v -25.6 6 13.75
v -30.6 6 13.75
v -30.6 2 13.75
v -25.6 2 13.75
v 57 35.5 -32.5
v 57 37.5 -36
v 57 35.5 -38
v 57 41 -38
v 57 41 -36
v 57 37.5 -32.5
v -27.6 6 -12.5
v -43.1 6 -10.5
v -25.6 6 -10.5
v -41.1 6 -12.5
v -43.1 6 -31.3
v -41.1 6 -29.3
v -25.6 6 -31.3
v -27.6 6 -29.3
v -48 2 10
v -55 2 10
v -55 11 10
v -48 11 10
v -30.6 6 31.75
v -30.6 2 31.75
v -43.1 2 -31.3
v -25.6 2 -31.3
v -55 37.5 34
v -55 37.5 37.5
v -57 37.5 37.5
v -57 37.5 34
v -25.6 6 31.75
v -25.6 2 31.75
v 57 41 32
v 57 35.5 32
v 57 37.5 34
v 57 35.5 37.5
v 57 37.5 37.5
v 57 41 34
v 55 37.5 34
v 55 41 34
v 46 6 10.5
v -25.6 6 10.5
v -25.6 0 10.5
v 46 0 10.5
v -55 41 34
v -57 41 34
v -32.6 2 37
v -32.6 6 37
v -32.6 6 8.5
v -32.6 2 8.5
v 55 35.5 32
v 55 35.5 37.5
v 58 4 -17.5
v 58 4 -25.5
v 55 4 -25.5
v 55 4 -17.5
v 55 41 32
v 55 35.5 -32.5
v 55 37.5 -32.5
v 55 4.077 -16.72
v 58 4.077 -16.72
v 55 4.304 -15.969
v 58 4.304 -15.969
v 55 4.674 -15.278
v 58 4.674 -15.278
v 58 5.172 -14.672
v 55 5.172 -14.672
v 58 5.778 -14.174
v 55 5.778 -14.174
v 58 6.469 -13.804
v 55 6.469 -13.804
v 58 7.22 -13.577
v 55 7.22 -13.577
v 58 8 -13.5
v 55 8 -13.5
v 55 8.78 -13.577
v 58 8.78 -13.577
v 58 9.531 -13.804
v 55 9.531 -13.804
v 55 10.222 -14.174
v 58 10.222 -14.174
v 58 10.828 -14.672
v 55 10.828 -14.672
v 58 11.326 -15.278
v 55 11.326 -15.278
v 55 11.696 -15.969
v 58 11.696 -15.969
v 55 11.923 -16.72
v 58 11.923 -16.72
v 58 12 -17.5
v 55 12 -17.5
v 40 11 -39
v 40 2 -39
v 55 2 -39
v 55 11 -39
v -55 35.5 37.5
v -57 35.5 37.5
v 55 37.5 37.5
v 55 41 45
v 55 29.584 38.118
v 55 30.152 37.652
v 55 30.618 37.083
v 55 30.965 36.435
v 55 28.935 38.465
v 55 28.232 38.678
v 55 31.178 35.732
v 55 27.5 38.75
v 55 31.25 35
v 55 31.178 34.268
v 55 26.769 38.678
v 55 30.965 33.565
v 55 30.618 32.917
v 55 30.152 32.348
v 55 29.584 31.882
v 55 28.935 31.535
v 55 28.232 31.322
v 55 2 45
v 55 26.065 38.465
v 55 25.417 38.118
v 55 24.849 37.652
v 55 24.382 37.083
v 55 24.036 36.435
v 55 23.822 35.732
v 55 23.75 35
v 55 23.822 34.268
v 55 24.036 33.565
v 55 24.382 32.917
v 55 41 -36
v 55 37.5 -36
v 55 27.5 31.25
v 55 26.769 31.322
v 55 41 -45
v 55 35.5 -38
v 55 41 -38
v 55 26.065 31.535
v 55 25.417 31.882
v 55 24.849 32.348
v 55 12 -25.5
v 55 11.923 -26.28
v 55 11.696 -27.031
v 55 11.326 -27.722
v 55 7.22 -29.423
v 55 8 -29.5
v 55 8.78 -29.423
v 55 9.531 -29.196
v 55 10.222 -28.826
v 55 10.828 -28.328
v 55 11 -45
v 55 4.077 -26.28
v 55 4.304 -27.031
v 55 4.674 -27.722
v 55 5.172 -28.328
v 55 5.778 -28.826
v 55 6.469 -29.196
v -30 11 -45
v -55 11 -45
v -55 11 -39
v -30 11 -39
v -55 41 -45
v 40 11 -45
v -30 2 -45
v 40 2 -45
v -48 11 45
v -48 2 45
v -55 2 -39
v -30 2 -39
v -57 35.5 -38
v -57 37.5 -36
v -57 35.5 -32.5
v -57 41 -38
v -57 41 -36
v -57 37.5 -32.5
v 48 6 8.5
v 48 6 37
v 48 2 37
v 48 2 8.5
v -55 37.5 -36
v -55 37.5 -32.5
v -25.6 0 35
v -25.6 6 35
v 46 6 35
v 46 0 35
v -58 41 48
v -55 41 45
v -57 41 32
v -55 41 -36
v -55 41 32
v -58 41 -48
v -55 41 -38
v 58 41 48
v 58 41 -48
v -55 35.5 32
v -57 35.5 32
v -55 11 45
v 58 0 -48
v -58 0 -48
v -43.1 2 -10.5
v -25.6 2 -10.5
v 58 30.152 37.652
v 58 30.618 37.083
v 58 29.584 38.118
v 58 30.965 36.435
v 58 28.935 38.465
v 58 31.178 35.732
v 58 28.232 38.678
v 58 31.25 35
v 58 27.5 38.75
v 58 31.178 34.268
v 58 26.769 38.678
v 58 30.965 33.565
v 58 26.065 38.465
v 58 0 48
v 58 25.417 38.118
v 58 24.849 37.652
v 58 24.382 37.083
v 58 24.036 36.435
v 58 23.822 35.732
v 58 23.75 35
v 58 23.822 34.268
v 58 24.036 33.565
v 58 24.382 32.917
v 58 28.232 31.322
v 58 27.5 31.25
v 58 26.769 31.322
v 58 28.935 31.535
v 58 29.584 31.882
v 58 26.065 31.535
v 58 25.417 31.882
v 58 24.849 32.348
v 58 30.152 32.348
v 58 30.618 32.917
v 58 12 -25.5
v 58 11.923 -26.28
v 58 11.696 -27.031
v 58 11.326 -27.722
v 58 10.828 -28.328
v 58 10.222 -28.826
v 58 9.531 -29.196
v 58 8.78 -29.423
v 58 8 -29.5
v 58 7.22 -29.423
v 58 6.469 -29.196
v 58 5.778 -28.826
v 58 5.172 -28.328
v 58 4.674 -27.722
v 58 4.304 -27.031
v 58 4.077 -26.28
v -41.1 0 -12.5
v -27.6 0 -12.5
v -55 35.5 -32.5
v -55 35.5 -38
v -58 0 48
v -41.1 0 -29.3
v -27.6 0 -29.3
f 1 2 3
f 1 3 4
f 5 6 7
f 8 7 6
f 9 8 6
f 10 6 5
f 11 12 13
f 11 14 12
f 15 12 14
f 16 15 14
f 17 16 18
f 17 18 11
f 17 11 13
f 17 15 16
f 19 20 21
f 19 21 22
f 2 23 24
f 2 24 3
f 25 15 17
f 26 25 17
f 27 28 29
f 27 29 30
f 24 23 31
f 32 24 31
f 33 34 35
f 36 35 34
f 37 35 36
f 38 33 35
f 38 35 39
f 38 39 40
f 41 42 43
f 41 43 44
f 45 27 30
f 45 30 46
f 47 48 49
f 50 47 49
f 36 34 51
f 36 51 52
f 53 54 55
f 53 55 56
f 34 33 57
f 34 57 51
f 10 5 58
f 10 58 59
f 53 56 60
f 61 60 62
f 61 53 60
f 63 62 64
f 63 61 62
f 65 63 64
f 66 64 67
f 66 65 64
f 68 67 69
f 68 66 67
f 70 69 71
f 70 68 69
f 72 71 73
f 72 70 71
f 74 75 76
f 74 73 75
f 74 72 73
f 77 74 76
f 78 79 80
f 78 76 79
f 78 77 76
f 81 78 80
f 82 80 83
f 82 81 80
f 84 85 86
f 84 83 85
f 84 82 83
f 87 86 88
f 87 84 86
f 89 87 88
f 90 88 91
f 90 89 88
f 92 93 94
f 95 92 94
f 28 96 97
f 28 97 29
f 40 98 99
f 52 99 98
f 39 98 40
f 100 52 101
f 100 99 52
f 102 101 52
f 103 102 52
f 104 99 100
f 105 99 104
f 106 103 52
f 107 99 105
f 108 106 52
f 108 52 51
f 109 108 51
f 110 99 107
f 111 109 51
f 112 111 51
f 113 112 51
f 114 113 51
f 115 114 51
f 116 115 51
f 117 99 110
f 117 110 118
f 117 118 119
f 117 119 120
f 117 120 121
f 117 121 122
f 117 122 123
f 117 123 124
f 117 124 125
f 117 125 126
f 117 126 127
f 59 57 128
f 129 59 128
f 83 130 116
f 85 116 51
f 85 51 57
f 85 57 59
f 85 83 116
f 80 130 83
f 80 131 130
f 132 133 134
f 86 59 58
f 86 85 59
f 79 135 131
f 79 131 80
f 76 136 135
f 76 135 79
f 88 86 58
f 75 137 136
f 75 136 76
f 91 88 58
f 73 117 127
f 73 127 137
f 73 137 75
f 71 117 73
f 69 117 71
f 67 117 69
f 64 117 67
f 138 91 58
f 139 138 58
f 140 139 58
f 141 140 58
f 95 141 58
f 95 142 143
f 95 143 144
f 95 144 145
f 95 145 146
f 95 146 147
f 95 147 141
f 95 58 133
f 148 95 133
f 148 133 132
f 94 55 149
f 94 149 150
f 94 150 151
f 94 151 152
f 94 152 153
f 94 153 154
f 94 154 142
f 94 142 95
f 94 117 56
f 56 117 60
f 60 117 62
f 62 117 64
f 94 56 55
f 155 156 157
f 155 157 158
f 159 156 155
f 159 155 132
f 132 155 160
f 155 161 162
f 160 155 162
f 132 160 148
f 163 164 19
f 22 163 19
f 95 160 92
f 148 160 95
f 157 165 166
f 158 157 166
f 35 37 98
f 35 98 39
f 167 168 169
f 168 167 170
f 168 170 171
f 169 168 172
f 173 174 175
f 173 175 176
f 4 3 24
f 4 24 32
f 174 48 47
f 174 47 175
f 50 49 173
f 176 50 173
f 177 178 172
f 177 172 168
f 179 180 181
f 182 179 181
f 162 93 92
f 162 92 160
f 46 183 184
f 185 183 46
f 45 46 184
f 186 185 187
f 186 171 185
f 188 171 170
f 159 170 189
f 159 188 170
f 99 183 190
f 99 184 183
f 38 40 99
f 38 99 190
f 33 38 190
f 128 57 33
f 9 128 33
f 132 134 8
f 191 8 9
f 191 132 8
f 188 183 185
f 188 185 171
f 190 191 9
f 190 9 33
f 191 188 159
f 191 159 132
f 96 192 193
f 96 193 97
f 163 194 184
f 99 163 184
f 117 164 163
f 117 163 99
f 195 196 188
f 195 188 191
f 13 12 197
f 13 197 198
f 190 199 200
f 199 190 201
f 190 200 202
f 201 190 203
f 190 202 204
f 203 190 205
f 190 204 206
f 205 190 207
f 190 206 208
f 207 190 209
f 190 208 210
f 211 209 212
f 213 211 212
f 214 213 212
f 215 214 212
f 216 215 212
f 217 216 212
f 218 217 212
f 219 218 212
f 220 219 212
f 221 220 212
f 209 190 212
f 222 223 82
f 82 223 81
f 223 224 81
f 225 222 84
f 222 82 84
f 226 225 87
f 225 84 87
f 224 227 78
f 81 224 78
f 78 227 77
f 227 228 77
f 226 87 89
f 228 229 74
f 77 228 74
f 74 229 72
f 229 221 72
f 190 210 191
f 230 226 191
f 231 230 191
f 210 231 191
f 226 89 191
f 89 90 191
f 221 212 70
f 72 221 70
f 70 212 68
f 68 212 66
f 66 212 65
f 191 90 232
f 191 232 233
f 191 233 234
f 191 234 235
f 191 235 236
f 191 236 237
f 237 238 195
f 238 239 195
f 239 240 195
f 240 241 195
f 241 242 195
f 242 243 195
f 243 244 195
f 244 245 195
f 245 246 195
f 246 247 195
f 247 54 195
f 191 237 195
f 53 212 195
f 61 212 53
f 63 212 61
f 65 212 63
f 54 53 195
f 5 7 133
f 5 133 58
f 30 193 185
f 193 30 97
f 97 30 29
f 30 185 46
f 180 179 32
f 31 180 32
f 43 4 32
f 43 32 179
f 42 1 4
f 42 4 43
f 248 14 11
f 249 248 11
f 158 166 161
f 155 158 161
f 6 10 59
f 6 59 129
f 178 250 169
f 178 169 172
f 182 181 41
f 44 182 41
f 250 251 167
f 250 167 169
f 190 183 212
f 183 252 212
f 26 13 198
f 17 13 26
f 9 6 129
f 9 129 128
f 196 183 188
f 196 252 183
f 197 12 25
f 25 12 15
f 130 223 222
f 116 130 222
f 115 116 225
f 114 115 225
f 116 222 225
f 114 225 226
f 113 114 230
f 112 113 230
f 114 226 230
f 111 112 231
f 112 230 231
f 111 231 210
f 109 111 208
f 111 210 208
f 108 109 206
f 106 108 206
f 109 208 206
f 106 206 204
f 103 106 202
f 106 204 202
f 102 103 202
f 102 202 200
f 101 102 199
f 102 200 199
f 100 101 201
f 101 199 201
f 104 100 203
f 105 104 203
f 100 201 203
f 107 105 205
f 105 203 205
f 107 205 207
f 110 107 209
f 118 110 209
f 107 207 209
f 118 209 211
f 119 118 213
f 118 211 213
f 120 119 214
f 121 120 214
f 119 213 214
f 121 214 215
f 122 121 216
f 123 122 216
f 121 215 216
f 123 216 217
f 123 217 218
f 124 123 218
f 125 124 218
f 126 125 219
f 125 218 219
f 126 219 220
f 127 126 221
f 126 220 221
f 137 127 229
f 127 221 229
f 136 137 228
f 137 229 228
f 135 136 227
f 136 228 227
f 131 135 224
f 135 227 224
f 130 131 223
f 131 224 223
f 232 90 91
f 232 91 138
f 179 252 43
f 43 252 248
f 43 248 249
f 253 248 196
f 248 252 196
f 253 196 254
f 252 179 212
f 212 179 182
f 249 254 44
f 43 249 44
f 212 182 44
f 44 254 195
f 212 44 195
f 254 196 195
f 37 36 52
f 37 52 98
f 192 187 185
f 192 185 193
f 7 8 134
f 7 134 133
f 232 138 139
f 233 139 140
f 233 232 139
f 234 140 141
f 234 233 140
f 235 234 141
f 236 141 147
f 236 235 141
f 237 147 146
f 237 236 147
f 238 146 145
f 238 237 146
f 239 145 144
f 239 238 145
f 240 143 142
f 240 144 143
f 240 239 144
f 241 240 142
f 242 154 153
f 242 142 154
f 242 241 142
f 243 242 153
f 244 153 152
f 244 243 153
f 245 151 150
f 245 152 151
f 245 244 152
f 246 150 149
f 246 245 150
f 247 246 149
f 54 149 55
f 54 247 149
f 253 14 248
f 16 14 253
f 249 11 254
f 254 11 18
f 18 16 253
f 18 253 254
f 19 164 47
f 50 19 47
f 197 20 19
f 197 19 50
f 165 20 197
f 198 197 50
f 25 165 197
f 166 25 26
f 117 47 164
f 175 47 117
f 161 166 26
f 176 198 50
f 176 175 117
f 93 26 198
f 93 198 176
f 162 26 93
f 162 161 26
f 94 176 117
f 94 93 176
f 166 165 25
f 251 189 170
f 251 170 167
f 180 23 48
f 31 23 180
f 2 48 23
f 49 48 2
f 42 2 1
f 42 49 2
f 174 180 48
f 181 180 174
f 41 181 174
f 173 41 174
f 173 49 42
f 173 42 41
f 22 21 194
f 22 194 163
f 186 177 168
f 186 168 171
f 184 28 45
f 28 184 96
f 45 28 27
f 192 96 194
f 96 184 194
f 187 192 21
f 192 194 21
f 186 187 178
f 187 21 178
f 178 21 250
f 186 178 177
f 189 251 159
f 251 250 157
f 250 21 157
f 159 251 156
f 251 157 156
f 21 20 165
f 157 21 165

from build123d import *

# Parameters (mm, degrees)
SKETCH1_W           = 116
SKETCH1_H           = 96
BOSS_EXTRUDE1_DEPTH = 6
SKETCH2_W           = 116
SKETCH2_H           = 96
SKETCH2_W_2         = 110
SKETCH2_H_2         = 90
BOSS_EXTRUDE2_DEPTH = 35
SKETCH3_W           = 71.6
SKETCH3_H           = 24.5
SKETCH3_W_2         = 13.5
SKETCH3_H_2         = 16.8
CUT_EXTRUDE1_DEPTH  = 35
SKETCH4_W           = 5
SKETCH4_H           = 18
CUT_EXTRUDE2_DEPTH  = 4
SKETCH6_R           = 3.75
CUT_EXTRUDE3_DEPTH  = 3
SKETCH7_W           = 110
SKETCH7_H           = 90
SKETCH7_W_2         = 80.6
SKETCH7_H_2         = 28.5
SKETCH7_W_3         = 17.5
SKETCH7_H_3         = 20.8
CUT_EXTRUDE4_DEPTH  = 4
SKETCH8_W           = 7
SKETCH8_H           = 35
SKETCH8_W_2         = 15
SKETCH8_H_2         = 6
SKETCH8_W_3         = 25
BOSS_EXTRUDE3_DEPTH = 9
CUT_EXTRUDE6_START  = -1
CUT_EXTRUDE6_DEPTH  = 114


with BuildPart() as part:
    # Sketch1 → Boss-Extrude1 (new body)
    with BuildSketch(Plane(origin=(0, 0, 0), x_dir=(1, 0, 0), z_dir=(0, 1, 0))):
        Rectangle(SKETCH1_W, SKETCH1_H)
    extrude(amount=BOSS_EXTRUDE1_DEPTH)

    # Sketch2 → Boss-Extrude2 (add)
    with BuildSketch(Plane(origin=(0, 6, 0), x_dir=(1, 0, 0), z_dir=(0, 1, 0))):
        Rectangle(SKETCH2_W, SKETCH2_H)
        Rectangle(SKETCH2_W_2, SKETCH2_H_2, mode=Mode.SUBTRACT)
    extrude(amount=BOSS_EXTRUDE2_DEPTH)

    # Sketch3 → Cut-Extrude1 (cut)
    with BuildSketch(Plane(origin=(0, 6, 0), x_dir=(1, 0, 0), z_dir=(0, 1, 0))):
        with Locations((10.2, -22.75)):
            Rectangle(SKETCH3_W, SKETCH3_H)
        with Locations((-34.35, 20.9)):
            Rectangle(SKETCH3_W_2, SKETCH3_H_2)
    extrude(amount=-CUT_EXTRUDE1_DEPTH, mode=Mode.SUBTRACT)

    # Sketch4 → Cut-Extrude2 (cut)
    with BuildSketch(Plane(origin=(0, 6, 0), x_dir=(1, 0, 0), z_dir=(0, 1, 0))):
        with Locations((-28.1, -22.75)):
            Rectangle(SKETCH4_W, SKETCH4_H)
    extrude(amount=-CUT_EXTRUDE2_DEPTH, mode=Mode.SUBTRACT)

    # Sketch6 → Cut-Extrude3 (cut)
    with BuildSketch(Plane(origin=(58, 0, 0), x_dir=(0, 0, -1), z_dir=(1, 0, 0))):
        with Locations((-35, 27.500245912)):
            Circle(SKETCH6_R)
        with BuildLine():
            Line((17.5, 12), (25.5, 12))
            ThreePointArc((25.5, 12), (29.5, 8), (25.5, 4))
            Line((25.5, 4), (17.5, 4))
            ThreePointArc((17.5, 4), (13.5, 8), (17.5, 12))
        make_face()
    extrude(amount=-CUT_EXTRUDE3_DEPTH, mode=Mode.SUBTRACT)

    # Sketch7 → Cut-Extrude4 (cut)
    with BuildSketch(Plane(origin=(0, 6, 0), x_dir=(1, 0, 0), z_dir=(0, 1, 0))):
        Rectangle(SKETCH7_W, SKETCH7_H)
        with Locations((7.7, -22.75)):
            Rectangle(SKETCH7_W_2, SKETCH7_H_2, mode=Mode.SUBTRACT)
        with Locations((-34.35, 20.9)):
            Rectangle(SKETCH7_W_3, SKETCH7_H_3, mode=Mode.SUBTRACT)
    extrude(amount=-CUT_EXTRUDE4_DEPTH, mode=Mode.SUBTRACT)

    # Sketch8 → Boss-Extrude3 (add)
    with BuildSketch(Plane(origin=(0, 2, 0), x_dir=(1, 0, 0), z_dir=(0, 1, 0))):
        with Locations((-51.5, -27.5)):
            Rectangle(SKETCH8_W, SKETCH8_H)
        with Locations((47.5, 42)):
            Rectangle(SKETCH8_W_2, SKETCH8_H_2)
        with Locations((-42.5, 42)):
            Rectangle(SKETCH8_W_3, SKETCH8_H_2)
    extrude(amount=BOSS_EXTRUDE3_DEPTH)

    # Sketch10 → Cut-Extrude6 (cut)
    with BuildSketch(Plane(origin=(58, 0, 0), x_dir=(0, 0, -1), z_dir=(1, 0, 0)).offset(CUT_EXTRUDE6_START)):
        Polygon((-32, 41), (-32, 35.5), (-37.5, 35.5), (-37.5, 37.5), (-34, 37.5), (-34, 41), align=None)
        Polygon((36, 41), (38, 41), (38, 35.5), (32.5, 35.5), (32.5, 37.5), (36, 37.5), align=None)
    extrude(amount=-CUT_EXTRUDE6_DEPTH, mode=Mode.SUBTRACT)


solid = part.part
